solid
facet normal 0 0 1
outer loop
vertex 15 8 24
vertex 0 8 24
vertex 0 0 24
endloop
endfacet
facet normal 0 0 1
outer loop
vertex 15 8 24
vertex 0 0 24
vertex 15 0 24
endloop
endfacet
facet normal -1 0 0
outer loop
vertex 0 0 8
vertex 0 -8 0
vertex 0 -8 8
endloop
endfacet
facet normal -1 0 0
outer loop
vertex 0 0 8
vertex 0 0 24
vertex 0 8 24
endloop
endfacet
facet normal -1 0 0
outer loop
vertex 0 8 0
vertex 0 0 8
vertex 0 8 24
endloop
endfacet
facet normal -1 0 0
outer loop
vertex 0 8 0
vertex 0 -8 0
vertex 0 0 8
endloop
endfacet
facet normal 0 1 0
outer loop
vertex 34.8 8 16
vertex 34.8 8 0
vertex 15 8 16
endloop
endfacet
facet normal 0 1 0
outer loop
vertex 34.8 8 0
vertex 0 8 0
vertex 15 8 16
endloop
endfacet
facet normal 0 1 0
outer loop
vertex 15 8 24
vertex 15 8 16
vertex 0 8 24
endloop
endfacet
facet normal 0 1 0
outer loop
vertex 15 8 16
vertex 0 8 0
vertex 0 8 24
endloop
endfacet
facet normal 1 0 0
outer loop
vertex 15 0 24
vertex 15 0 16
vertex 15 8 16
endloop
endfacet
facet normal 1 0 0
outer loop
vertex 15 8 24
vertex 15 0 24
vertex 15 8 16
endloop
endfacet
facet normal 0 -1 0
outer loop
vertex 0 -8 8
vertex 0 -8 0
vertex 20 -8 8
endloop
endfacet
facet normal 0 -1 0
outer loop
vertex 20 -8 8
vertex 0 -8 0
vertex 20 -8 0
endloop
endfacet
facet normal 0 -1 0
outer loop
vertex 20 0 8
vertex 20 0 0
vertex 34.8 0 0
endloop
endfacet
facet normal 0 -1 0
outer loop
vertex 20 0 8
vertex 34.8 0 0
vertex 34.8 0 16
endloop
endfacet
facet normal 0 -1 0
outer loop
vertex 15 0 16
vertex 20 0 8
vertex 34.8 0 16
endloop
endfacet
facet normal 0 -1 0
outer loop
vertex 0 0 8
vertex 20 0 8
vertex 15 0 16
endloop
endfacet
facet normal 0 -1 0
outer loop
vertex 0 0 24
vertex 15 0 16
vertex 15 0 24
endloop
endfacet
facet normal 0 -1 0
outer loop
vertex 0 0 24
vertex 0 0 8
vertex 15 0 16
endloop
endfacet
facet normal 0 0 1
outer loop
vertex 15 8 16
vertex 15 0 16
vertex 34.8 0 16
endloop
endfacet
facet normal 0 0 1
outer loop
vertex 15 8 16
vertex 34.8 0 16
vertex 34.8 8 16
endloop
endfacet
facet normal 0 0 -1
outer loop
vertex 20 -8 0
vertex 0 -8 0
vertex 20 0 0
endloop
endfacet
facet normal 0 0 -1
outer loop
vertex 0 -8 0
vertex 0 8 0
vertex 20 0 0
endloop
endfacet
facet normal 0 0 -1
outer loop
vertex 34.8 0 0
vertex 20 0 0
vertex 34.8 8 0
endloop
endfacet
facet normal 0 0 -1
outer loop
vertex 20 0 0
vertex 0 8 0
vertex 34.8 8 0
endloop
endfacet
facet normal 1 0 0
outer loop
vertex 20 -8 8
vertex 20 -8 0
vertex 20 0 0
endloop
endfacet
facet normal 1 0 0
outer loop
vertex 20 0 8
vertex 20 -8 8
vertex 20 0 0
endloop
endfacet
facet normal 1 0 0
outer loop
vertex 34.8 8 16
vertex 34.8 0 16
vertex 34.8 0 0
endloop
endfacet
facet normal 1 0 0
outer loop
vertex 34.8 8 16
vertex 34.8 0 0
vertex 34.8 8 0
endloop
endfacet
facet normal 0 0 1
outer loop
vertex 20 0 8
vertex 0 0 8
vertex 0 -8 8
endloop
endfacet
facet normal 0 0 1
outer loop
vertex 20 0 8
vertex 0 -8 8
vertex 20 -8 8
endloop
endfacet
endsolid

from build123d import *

# Parameters (mm, degrees)
F0_W     = 15
F0_H     = 8
F1_DEPTH = 24
F2_W     = 8
F2_H     = 16
F3_DEPTH = 19.8
F4_W     = 20
F4_H     = 8
F5_DEPTH = 8


with BuildPart() as f1:
    # F0 (on Top) → F1 (new body)
    with BuildSketch(Plane.XY):
        with Locations((7.5, 4)):
            Rectangle(F0_W, F0_H)
    extrude(amount=F1_DEPTH)

    # F2 (on face) → F3 (join)
    with BuildSketch(Plane.YZ.offset(15)):
        with Locations((4, 8)):
            Rectangle(F2_W, F2_H)
    extrude(amount=F3_DEPTH)

    # F4 (on Top) → F5 (join)
    with BuildSketch(Plane.XY):
        with Locations((10, -4)):
            Rectangle(F4_W, F4_H)
    extrude(amount=F5_DEPTH)


solid = f1.part
